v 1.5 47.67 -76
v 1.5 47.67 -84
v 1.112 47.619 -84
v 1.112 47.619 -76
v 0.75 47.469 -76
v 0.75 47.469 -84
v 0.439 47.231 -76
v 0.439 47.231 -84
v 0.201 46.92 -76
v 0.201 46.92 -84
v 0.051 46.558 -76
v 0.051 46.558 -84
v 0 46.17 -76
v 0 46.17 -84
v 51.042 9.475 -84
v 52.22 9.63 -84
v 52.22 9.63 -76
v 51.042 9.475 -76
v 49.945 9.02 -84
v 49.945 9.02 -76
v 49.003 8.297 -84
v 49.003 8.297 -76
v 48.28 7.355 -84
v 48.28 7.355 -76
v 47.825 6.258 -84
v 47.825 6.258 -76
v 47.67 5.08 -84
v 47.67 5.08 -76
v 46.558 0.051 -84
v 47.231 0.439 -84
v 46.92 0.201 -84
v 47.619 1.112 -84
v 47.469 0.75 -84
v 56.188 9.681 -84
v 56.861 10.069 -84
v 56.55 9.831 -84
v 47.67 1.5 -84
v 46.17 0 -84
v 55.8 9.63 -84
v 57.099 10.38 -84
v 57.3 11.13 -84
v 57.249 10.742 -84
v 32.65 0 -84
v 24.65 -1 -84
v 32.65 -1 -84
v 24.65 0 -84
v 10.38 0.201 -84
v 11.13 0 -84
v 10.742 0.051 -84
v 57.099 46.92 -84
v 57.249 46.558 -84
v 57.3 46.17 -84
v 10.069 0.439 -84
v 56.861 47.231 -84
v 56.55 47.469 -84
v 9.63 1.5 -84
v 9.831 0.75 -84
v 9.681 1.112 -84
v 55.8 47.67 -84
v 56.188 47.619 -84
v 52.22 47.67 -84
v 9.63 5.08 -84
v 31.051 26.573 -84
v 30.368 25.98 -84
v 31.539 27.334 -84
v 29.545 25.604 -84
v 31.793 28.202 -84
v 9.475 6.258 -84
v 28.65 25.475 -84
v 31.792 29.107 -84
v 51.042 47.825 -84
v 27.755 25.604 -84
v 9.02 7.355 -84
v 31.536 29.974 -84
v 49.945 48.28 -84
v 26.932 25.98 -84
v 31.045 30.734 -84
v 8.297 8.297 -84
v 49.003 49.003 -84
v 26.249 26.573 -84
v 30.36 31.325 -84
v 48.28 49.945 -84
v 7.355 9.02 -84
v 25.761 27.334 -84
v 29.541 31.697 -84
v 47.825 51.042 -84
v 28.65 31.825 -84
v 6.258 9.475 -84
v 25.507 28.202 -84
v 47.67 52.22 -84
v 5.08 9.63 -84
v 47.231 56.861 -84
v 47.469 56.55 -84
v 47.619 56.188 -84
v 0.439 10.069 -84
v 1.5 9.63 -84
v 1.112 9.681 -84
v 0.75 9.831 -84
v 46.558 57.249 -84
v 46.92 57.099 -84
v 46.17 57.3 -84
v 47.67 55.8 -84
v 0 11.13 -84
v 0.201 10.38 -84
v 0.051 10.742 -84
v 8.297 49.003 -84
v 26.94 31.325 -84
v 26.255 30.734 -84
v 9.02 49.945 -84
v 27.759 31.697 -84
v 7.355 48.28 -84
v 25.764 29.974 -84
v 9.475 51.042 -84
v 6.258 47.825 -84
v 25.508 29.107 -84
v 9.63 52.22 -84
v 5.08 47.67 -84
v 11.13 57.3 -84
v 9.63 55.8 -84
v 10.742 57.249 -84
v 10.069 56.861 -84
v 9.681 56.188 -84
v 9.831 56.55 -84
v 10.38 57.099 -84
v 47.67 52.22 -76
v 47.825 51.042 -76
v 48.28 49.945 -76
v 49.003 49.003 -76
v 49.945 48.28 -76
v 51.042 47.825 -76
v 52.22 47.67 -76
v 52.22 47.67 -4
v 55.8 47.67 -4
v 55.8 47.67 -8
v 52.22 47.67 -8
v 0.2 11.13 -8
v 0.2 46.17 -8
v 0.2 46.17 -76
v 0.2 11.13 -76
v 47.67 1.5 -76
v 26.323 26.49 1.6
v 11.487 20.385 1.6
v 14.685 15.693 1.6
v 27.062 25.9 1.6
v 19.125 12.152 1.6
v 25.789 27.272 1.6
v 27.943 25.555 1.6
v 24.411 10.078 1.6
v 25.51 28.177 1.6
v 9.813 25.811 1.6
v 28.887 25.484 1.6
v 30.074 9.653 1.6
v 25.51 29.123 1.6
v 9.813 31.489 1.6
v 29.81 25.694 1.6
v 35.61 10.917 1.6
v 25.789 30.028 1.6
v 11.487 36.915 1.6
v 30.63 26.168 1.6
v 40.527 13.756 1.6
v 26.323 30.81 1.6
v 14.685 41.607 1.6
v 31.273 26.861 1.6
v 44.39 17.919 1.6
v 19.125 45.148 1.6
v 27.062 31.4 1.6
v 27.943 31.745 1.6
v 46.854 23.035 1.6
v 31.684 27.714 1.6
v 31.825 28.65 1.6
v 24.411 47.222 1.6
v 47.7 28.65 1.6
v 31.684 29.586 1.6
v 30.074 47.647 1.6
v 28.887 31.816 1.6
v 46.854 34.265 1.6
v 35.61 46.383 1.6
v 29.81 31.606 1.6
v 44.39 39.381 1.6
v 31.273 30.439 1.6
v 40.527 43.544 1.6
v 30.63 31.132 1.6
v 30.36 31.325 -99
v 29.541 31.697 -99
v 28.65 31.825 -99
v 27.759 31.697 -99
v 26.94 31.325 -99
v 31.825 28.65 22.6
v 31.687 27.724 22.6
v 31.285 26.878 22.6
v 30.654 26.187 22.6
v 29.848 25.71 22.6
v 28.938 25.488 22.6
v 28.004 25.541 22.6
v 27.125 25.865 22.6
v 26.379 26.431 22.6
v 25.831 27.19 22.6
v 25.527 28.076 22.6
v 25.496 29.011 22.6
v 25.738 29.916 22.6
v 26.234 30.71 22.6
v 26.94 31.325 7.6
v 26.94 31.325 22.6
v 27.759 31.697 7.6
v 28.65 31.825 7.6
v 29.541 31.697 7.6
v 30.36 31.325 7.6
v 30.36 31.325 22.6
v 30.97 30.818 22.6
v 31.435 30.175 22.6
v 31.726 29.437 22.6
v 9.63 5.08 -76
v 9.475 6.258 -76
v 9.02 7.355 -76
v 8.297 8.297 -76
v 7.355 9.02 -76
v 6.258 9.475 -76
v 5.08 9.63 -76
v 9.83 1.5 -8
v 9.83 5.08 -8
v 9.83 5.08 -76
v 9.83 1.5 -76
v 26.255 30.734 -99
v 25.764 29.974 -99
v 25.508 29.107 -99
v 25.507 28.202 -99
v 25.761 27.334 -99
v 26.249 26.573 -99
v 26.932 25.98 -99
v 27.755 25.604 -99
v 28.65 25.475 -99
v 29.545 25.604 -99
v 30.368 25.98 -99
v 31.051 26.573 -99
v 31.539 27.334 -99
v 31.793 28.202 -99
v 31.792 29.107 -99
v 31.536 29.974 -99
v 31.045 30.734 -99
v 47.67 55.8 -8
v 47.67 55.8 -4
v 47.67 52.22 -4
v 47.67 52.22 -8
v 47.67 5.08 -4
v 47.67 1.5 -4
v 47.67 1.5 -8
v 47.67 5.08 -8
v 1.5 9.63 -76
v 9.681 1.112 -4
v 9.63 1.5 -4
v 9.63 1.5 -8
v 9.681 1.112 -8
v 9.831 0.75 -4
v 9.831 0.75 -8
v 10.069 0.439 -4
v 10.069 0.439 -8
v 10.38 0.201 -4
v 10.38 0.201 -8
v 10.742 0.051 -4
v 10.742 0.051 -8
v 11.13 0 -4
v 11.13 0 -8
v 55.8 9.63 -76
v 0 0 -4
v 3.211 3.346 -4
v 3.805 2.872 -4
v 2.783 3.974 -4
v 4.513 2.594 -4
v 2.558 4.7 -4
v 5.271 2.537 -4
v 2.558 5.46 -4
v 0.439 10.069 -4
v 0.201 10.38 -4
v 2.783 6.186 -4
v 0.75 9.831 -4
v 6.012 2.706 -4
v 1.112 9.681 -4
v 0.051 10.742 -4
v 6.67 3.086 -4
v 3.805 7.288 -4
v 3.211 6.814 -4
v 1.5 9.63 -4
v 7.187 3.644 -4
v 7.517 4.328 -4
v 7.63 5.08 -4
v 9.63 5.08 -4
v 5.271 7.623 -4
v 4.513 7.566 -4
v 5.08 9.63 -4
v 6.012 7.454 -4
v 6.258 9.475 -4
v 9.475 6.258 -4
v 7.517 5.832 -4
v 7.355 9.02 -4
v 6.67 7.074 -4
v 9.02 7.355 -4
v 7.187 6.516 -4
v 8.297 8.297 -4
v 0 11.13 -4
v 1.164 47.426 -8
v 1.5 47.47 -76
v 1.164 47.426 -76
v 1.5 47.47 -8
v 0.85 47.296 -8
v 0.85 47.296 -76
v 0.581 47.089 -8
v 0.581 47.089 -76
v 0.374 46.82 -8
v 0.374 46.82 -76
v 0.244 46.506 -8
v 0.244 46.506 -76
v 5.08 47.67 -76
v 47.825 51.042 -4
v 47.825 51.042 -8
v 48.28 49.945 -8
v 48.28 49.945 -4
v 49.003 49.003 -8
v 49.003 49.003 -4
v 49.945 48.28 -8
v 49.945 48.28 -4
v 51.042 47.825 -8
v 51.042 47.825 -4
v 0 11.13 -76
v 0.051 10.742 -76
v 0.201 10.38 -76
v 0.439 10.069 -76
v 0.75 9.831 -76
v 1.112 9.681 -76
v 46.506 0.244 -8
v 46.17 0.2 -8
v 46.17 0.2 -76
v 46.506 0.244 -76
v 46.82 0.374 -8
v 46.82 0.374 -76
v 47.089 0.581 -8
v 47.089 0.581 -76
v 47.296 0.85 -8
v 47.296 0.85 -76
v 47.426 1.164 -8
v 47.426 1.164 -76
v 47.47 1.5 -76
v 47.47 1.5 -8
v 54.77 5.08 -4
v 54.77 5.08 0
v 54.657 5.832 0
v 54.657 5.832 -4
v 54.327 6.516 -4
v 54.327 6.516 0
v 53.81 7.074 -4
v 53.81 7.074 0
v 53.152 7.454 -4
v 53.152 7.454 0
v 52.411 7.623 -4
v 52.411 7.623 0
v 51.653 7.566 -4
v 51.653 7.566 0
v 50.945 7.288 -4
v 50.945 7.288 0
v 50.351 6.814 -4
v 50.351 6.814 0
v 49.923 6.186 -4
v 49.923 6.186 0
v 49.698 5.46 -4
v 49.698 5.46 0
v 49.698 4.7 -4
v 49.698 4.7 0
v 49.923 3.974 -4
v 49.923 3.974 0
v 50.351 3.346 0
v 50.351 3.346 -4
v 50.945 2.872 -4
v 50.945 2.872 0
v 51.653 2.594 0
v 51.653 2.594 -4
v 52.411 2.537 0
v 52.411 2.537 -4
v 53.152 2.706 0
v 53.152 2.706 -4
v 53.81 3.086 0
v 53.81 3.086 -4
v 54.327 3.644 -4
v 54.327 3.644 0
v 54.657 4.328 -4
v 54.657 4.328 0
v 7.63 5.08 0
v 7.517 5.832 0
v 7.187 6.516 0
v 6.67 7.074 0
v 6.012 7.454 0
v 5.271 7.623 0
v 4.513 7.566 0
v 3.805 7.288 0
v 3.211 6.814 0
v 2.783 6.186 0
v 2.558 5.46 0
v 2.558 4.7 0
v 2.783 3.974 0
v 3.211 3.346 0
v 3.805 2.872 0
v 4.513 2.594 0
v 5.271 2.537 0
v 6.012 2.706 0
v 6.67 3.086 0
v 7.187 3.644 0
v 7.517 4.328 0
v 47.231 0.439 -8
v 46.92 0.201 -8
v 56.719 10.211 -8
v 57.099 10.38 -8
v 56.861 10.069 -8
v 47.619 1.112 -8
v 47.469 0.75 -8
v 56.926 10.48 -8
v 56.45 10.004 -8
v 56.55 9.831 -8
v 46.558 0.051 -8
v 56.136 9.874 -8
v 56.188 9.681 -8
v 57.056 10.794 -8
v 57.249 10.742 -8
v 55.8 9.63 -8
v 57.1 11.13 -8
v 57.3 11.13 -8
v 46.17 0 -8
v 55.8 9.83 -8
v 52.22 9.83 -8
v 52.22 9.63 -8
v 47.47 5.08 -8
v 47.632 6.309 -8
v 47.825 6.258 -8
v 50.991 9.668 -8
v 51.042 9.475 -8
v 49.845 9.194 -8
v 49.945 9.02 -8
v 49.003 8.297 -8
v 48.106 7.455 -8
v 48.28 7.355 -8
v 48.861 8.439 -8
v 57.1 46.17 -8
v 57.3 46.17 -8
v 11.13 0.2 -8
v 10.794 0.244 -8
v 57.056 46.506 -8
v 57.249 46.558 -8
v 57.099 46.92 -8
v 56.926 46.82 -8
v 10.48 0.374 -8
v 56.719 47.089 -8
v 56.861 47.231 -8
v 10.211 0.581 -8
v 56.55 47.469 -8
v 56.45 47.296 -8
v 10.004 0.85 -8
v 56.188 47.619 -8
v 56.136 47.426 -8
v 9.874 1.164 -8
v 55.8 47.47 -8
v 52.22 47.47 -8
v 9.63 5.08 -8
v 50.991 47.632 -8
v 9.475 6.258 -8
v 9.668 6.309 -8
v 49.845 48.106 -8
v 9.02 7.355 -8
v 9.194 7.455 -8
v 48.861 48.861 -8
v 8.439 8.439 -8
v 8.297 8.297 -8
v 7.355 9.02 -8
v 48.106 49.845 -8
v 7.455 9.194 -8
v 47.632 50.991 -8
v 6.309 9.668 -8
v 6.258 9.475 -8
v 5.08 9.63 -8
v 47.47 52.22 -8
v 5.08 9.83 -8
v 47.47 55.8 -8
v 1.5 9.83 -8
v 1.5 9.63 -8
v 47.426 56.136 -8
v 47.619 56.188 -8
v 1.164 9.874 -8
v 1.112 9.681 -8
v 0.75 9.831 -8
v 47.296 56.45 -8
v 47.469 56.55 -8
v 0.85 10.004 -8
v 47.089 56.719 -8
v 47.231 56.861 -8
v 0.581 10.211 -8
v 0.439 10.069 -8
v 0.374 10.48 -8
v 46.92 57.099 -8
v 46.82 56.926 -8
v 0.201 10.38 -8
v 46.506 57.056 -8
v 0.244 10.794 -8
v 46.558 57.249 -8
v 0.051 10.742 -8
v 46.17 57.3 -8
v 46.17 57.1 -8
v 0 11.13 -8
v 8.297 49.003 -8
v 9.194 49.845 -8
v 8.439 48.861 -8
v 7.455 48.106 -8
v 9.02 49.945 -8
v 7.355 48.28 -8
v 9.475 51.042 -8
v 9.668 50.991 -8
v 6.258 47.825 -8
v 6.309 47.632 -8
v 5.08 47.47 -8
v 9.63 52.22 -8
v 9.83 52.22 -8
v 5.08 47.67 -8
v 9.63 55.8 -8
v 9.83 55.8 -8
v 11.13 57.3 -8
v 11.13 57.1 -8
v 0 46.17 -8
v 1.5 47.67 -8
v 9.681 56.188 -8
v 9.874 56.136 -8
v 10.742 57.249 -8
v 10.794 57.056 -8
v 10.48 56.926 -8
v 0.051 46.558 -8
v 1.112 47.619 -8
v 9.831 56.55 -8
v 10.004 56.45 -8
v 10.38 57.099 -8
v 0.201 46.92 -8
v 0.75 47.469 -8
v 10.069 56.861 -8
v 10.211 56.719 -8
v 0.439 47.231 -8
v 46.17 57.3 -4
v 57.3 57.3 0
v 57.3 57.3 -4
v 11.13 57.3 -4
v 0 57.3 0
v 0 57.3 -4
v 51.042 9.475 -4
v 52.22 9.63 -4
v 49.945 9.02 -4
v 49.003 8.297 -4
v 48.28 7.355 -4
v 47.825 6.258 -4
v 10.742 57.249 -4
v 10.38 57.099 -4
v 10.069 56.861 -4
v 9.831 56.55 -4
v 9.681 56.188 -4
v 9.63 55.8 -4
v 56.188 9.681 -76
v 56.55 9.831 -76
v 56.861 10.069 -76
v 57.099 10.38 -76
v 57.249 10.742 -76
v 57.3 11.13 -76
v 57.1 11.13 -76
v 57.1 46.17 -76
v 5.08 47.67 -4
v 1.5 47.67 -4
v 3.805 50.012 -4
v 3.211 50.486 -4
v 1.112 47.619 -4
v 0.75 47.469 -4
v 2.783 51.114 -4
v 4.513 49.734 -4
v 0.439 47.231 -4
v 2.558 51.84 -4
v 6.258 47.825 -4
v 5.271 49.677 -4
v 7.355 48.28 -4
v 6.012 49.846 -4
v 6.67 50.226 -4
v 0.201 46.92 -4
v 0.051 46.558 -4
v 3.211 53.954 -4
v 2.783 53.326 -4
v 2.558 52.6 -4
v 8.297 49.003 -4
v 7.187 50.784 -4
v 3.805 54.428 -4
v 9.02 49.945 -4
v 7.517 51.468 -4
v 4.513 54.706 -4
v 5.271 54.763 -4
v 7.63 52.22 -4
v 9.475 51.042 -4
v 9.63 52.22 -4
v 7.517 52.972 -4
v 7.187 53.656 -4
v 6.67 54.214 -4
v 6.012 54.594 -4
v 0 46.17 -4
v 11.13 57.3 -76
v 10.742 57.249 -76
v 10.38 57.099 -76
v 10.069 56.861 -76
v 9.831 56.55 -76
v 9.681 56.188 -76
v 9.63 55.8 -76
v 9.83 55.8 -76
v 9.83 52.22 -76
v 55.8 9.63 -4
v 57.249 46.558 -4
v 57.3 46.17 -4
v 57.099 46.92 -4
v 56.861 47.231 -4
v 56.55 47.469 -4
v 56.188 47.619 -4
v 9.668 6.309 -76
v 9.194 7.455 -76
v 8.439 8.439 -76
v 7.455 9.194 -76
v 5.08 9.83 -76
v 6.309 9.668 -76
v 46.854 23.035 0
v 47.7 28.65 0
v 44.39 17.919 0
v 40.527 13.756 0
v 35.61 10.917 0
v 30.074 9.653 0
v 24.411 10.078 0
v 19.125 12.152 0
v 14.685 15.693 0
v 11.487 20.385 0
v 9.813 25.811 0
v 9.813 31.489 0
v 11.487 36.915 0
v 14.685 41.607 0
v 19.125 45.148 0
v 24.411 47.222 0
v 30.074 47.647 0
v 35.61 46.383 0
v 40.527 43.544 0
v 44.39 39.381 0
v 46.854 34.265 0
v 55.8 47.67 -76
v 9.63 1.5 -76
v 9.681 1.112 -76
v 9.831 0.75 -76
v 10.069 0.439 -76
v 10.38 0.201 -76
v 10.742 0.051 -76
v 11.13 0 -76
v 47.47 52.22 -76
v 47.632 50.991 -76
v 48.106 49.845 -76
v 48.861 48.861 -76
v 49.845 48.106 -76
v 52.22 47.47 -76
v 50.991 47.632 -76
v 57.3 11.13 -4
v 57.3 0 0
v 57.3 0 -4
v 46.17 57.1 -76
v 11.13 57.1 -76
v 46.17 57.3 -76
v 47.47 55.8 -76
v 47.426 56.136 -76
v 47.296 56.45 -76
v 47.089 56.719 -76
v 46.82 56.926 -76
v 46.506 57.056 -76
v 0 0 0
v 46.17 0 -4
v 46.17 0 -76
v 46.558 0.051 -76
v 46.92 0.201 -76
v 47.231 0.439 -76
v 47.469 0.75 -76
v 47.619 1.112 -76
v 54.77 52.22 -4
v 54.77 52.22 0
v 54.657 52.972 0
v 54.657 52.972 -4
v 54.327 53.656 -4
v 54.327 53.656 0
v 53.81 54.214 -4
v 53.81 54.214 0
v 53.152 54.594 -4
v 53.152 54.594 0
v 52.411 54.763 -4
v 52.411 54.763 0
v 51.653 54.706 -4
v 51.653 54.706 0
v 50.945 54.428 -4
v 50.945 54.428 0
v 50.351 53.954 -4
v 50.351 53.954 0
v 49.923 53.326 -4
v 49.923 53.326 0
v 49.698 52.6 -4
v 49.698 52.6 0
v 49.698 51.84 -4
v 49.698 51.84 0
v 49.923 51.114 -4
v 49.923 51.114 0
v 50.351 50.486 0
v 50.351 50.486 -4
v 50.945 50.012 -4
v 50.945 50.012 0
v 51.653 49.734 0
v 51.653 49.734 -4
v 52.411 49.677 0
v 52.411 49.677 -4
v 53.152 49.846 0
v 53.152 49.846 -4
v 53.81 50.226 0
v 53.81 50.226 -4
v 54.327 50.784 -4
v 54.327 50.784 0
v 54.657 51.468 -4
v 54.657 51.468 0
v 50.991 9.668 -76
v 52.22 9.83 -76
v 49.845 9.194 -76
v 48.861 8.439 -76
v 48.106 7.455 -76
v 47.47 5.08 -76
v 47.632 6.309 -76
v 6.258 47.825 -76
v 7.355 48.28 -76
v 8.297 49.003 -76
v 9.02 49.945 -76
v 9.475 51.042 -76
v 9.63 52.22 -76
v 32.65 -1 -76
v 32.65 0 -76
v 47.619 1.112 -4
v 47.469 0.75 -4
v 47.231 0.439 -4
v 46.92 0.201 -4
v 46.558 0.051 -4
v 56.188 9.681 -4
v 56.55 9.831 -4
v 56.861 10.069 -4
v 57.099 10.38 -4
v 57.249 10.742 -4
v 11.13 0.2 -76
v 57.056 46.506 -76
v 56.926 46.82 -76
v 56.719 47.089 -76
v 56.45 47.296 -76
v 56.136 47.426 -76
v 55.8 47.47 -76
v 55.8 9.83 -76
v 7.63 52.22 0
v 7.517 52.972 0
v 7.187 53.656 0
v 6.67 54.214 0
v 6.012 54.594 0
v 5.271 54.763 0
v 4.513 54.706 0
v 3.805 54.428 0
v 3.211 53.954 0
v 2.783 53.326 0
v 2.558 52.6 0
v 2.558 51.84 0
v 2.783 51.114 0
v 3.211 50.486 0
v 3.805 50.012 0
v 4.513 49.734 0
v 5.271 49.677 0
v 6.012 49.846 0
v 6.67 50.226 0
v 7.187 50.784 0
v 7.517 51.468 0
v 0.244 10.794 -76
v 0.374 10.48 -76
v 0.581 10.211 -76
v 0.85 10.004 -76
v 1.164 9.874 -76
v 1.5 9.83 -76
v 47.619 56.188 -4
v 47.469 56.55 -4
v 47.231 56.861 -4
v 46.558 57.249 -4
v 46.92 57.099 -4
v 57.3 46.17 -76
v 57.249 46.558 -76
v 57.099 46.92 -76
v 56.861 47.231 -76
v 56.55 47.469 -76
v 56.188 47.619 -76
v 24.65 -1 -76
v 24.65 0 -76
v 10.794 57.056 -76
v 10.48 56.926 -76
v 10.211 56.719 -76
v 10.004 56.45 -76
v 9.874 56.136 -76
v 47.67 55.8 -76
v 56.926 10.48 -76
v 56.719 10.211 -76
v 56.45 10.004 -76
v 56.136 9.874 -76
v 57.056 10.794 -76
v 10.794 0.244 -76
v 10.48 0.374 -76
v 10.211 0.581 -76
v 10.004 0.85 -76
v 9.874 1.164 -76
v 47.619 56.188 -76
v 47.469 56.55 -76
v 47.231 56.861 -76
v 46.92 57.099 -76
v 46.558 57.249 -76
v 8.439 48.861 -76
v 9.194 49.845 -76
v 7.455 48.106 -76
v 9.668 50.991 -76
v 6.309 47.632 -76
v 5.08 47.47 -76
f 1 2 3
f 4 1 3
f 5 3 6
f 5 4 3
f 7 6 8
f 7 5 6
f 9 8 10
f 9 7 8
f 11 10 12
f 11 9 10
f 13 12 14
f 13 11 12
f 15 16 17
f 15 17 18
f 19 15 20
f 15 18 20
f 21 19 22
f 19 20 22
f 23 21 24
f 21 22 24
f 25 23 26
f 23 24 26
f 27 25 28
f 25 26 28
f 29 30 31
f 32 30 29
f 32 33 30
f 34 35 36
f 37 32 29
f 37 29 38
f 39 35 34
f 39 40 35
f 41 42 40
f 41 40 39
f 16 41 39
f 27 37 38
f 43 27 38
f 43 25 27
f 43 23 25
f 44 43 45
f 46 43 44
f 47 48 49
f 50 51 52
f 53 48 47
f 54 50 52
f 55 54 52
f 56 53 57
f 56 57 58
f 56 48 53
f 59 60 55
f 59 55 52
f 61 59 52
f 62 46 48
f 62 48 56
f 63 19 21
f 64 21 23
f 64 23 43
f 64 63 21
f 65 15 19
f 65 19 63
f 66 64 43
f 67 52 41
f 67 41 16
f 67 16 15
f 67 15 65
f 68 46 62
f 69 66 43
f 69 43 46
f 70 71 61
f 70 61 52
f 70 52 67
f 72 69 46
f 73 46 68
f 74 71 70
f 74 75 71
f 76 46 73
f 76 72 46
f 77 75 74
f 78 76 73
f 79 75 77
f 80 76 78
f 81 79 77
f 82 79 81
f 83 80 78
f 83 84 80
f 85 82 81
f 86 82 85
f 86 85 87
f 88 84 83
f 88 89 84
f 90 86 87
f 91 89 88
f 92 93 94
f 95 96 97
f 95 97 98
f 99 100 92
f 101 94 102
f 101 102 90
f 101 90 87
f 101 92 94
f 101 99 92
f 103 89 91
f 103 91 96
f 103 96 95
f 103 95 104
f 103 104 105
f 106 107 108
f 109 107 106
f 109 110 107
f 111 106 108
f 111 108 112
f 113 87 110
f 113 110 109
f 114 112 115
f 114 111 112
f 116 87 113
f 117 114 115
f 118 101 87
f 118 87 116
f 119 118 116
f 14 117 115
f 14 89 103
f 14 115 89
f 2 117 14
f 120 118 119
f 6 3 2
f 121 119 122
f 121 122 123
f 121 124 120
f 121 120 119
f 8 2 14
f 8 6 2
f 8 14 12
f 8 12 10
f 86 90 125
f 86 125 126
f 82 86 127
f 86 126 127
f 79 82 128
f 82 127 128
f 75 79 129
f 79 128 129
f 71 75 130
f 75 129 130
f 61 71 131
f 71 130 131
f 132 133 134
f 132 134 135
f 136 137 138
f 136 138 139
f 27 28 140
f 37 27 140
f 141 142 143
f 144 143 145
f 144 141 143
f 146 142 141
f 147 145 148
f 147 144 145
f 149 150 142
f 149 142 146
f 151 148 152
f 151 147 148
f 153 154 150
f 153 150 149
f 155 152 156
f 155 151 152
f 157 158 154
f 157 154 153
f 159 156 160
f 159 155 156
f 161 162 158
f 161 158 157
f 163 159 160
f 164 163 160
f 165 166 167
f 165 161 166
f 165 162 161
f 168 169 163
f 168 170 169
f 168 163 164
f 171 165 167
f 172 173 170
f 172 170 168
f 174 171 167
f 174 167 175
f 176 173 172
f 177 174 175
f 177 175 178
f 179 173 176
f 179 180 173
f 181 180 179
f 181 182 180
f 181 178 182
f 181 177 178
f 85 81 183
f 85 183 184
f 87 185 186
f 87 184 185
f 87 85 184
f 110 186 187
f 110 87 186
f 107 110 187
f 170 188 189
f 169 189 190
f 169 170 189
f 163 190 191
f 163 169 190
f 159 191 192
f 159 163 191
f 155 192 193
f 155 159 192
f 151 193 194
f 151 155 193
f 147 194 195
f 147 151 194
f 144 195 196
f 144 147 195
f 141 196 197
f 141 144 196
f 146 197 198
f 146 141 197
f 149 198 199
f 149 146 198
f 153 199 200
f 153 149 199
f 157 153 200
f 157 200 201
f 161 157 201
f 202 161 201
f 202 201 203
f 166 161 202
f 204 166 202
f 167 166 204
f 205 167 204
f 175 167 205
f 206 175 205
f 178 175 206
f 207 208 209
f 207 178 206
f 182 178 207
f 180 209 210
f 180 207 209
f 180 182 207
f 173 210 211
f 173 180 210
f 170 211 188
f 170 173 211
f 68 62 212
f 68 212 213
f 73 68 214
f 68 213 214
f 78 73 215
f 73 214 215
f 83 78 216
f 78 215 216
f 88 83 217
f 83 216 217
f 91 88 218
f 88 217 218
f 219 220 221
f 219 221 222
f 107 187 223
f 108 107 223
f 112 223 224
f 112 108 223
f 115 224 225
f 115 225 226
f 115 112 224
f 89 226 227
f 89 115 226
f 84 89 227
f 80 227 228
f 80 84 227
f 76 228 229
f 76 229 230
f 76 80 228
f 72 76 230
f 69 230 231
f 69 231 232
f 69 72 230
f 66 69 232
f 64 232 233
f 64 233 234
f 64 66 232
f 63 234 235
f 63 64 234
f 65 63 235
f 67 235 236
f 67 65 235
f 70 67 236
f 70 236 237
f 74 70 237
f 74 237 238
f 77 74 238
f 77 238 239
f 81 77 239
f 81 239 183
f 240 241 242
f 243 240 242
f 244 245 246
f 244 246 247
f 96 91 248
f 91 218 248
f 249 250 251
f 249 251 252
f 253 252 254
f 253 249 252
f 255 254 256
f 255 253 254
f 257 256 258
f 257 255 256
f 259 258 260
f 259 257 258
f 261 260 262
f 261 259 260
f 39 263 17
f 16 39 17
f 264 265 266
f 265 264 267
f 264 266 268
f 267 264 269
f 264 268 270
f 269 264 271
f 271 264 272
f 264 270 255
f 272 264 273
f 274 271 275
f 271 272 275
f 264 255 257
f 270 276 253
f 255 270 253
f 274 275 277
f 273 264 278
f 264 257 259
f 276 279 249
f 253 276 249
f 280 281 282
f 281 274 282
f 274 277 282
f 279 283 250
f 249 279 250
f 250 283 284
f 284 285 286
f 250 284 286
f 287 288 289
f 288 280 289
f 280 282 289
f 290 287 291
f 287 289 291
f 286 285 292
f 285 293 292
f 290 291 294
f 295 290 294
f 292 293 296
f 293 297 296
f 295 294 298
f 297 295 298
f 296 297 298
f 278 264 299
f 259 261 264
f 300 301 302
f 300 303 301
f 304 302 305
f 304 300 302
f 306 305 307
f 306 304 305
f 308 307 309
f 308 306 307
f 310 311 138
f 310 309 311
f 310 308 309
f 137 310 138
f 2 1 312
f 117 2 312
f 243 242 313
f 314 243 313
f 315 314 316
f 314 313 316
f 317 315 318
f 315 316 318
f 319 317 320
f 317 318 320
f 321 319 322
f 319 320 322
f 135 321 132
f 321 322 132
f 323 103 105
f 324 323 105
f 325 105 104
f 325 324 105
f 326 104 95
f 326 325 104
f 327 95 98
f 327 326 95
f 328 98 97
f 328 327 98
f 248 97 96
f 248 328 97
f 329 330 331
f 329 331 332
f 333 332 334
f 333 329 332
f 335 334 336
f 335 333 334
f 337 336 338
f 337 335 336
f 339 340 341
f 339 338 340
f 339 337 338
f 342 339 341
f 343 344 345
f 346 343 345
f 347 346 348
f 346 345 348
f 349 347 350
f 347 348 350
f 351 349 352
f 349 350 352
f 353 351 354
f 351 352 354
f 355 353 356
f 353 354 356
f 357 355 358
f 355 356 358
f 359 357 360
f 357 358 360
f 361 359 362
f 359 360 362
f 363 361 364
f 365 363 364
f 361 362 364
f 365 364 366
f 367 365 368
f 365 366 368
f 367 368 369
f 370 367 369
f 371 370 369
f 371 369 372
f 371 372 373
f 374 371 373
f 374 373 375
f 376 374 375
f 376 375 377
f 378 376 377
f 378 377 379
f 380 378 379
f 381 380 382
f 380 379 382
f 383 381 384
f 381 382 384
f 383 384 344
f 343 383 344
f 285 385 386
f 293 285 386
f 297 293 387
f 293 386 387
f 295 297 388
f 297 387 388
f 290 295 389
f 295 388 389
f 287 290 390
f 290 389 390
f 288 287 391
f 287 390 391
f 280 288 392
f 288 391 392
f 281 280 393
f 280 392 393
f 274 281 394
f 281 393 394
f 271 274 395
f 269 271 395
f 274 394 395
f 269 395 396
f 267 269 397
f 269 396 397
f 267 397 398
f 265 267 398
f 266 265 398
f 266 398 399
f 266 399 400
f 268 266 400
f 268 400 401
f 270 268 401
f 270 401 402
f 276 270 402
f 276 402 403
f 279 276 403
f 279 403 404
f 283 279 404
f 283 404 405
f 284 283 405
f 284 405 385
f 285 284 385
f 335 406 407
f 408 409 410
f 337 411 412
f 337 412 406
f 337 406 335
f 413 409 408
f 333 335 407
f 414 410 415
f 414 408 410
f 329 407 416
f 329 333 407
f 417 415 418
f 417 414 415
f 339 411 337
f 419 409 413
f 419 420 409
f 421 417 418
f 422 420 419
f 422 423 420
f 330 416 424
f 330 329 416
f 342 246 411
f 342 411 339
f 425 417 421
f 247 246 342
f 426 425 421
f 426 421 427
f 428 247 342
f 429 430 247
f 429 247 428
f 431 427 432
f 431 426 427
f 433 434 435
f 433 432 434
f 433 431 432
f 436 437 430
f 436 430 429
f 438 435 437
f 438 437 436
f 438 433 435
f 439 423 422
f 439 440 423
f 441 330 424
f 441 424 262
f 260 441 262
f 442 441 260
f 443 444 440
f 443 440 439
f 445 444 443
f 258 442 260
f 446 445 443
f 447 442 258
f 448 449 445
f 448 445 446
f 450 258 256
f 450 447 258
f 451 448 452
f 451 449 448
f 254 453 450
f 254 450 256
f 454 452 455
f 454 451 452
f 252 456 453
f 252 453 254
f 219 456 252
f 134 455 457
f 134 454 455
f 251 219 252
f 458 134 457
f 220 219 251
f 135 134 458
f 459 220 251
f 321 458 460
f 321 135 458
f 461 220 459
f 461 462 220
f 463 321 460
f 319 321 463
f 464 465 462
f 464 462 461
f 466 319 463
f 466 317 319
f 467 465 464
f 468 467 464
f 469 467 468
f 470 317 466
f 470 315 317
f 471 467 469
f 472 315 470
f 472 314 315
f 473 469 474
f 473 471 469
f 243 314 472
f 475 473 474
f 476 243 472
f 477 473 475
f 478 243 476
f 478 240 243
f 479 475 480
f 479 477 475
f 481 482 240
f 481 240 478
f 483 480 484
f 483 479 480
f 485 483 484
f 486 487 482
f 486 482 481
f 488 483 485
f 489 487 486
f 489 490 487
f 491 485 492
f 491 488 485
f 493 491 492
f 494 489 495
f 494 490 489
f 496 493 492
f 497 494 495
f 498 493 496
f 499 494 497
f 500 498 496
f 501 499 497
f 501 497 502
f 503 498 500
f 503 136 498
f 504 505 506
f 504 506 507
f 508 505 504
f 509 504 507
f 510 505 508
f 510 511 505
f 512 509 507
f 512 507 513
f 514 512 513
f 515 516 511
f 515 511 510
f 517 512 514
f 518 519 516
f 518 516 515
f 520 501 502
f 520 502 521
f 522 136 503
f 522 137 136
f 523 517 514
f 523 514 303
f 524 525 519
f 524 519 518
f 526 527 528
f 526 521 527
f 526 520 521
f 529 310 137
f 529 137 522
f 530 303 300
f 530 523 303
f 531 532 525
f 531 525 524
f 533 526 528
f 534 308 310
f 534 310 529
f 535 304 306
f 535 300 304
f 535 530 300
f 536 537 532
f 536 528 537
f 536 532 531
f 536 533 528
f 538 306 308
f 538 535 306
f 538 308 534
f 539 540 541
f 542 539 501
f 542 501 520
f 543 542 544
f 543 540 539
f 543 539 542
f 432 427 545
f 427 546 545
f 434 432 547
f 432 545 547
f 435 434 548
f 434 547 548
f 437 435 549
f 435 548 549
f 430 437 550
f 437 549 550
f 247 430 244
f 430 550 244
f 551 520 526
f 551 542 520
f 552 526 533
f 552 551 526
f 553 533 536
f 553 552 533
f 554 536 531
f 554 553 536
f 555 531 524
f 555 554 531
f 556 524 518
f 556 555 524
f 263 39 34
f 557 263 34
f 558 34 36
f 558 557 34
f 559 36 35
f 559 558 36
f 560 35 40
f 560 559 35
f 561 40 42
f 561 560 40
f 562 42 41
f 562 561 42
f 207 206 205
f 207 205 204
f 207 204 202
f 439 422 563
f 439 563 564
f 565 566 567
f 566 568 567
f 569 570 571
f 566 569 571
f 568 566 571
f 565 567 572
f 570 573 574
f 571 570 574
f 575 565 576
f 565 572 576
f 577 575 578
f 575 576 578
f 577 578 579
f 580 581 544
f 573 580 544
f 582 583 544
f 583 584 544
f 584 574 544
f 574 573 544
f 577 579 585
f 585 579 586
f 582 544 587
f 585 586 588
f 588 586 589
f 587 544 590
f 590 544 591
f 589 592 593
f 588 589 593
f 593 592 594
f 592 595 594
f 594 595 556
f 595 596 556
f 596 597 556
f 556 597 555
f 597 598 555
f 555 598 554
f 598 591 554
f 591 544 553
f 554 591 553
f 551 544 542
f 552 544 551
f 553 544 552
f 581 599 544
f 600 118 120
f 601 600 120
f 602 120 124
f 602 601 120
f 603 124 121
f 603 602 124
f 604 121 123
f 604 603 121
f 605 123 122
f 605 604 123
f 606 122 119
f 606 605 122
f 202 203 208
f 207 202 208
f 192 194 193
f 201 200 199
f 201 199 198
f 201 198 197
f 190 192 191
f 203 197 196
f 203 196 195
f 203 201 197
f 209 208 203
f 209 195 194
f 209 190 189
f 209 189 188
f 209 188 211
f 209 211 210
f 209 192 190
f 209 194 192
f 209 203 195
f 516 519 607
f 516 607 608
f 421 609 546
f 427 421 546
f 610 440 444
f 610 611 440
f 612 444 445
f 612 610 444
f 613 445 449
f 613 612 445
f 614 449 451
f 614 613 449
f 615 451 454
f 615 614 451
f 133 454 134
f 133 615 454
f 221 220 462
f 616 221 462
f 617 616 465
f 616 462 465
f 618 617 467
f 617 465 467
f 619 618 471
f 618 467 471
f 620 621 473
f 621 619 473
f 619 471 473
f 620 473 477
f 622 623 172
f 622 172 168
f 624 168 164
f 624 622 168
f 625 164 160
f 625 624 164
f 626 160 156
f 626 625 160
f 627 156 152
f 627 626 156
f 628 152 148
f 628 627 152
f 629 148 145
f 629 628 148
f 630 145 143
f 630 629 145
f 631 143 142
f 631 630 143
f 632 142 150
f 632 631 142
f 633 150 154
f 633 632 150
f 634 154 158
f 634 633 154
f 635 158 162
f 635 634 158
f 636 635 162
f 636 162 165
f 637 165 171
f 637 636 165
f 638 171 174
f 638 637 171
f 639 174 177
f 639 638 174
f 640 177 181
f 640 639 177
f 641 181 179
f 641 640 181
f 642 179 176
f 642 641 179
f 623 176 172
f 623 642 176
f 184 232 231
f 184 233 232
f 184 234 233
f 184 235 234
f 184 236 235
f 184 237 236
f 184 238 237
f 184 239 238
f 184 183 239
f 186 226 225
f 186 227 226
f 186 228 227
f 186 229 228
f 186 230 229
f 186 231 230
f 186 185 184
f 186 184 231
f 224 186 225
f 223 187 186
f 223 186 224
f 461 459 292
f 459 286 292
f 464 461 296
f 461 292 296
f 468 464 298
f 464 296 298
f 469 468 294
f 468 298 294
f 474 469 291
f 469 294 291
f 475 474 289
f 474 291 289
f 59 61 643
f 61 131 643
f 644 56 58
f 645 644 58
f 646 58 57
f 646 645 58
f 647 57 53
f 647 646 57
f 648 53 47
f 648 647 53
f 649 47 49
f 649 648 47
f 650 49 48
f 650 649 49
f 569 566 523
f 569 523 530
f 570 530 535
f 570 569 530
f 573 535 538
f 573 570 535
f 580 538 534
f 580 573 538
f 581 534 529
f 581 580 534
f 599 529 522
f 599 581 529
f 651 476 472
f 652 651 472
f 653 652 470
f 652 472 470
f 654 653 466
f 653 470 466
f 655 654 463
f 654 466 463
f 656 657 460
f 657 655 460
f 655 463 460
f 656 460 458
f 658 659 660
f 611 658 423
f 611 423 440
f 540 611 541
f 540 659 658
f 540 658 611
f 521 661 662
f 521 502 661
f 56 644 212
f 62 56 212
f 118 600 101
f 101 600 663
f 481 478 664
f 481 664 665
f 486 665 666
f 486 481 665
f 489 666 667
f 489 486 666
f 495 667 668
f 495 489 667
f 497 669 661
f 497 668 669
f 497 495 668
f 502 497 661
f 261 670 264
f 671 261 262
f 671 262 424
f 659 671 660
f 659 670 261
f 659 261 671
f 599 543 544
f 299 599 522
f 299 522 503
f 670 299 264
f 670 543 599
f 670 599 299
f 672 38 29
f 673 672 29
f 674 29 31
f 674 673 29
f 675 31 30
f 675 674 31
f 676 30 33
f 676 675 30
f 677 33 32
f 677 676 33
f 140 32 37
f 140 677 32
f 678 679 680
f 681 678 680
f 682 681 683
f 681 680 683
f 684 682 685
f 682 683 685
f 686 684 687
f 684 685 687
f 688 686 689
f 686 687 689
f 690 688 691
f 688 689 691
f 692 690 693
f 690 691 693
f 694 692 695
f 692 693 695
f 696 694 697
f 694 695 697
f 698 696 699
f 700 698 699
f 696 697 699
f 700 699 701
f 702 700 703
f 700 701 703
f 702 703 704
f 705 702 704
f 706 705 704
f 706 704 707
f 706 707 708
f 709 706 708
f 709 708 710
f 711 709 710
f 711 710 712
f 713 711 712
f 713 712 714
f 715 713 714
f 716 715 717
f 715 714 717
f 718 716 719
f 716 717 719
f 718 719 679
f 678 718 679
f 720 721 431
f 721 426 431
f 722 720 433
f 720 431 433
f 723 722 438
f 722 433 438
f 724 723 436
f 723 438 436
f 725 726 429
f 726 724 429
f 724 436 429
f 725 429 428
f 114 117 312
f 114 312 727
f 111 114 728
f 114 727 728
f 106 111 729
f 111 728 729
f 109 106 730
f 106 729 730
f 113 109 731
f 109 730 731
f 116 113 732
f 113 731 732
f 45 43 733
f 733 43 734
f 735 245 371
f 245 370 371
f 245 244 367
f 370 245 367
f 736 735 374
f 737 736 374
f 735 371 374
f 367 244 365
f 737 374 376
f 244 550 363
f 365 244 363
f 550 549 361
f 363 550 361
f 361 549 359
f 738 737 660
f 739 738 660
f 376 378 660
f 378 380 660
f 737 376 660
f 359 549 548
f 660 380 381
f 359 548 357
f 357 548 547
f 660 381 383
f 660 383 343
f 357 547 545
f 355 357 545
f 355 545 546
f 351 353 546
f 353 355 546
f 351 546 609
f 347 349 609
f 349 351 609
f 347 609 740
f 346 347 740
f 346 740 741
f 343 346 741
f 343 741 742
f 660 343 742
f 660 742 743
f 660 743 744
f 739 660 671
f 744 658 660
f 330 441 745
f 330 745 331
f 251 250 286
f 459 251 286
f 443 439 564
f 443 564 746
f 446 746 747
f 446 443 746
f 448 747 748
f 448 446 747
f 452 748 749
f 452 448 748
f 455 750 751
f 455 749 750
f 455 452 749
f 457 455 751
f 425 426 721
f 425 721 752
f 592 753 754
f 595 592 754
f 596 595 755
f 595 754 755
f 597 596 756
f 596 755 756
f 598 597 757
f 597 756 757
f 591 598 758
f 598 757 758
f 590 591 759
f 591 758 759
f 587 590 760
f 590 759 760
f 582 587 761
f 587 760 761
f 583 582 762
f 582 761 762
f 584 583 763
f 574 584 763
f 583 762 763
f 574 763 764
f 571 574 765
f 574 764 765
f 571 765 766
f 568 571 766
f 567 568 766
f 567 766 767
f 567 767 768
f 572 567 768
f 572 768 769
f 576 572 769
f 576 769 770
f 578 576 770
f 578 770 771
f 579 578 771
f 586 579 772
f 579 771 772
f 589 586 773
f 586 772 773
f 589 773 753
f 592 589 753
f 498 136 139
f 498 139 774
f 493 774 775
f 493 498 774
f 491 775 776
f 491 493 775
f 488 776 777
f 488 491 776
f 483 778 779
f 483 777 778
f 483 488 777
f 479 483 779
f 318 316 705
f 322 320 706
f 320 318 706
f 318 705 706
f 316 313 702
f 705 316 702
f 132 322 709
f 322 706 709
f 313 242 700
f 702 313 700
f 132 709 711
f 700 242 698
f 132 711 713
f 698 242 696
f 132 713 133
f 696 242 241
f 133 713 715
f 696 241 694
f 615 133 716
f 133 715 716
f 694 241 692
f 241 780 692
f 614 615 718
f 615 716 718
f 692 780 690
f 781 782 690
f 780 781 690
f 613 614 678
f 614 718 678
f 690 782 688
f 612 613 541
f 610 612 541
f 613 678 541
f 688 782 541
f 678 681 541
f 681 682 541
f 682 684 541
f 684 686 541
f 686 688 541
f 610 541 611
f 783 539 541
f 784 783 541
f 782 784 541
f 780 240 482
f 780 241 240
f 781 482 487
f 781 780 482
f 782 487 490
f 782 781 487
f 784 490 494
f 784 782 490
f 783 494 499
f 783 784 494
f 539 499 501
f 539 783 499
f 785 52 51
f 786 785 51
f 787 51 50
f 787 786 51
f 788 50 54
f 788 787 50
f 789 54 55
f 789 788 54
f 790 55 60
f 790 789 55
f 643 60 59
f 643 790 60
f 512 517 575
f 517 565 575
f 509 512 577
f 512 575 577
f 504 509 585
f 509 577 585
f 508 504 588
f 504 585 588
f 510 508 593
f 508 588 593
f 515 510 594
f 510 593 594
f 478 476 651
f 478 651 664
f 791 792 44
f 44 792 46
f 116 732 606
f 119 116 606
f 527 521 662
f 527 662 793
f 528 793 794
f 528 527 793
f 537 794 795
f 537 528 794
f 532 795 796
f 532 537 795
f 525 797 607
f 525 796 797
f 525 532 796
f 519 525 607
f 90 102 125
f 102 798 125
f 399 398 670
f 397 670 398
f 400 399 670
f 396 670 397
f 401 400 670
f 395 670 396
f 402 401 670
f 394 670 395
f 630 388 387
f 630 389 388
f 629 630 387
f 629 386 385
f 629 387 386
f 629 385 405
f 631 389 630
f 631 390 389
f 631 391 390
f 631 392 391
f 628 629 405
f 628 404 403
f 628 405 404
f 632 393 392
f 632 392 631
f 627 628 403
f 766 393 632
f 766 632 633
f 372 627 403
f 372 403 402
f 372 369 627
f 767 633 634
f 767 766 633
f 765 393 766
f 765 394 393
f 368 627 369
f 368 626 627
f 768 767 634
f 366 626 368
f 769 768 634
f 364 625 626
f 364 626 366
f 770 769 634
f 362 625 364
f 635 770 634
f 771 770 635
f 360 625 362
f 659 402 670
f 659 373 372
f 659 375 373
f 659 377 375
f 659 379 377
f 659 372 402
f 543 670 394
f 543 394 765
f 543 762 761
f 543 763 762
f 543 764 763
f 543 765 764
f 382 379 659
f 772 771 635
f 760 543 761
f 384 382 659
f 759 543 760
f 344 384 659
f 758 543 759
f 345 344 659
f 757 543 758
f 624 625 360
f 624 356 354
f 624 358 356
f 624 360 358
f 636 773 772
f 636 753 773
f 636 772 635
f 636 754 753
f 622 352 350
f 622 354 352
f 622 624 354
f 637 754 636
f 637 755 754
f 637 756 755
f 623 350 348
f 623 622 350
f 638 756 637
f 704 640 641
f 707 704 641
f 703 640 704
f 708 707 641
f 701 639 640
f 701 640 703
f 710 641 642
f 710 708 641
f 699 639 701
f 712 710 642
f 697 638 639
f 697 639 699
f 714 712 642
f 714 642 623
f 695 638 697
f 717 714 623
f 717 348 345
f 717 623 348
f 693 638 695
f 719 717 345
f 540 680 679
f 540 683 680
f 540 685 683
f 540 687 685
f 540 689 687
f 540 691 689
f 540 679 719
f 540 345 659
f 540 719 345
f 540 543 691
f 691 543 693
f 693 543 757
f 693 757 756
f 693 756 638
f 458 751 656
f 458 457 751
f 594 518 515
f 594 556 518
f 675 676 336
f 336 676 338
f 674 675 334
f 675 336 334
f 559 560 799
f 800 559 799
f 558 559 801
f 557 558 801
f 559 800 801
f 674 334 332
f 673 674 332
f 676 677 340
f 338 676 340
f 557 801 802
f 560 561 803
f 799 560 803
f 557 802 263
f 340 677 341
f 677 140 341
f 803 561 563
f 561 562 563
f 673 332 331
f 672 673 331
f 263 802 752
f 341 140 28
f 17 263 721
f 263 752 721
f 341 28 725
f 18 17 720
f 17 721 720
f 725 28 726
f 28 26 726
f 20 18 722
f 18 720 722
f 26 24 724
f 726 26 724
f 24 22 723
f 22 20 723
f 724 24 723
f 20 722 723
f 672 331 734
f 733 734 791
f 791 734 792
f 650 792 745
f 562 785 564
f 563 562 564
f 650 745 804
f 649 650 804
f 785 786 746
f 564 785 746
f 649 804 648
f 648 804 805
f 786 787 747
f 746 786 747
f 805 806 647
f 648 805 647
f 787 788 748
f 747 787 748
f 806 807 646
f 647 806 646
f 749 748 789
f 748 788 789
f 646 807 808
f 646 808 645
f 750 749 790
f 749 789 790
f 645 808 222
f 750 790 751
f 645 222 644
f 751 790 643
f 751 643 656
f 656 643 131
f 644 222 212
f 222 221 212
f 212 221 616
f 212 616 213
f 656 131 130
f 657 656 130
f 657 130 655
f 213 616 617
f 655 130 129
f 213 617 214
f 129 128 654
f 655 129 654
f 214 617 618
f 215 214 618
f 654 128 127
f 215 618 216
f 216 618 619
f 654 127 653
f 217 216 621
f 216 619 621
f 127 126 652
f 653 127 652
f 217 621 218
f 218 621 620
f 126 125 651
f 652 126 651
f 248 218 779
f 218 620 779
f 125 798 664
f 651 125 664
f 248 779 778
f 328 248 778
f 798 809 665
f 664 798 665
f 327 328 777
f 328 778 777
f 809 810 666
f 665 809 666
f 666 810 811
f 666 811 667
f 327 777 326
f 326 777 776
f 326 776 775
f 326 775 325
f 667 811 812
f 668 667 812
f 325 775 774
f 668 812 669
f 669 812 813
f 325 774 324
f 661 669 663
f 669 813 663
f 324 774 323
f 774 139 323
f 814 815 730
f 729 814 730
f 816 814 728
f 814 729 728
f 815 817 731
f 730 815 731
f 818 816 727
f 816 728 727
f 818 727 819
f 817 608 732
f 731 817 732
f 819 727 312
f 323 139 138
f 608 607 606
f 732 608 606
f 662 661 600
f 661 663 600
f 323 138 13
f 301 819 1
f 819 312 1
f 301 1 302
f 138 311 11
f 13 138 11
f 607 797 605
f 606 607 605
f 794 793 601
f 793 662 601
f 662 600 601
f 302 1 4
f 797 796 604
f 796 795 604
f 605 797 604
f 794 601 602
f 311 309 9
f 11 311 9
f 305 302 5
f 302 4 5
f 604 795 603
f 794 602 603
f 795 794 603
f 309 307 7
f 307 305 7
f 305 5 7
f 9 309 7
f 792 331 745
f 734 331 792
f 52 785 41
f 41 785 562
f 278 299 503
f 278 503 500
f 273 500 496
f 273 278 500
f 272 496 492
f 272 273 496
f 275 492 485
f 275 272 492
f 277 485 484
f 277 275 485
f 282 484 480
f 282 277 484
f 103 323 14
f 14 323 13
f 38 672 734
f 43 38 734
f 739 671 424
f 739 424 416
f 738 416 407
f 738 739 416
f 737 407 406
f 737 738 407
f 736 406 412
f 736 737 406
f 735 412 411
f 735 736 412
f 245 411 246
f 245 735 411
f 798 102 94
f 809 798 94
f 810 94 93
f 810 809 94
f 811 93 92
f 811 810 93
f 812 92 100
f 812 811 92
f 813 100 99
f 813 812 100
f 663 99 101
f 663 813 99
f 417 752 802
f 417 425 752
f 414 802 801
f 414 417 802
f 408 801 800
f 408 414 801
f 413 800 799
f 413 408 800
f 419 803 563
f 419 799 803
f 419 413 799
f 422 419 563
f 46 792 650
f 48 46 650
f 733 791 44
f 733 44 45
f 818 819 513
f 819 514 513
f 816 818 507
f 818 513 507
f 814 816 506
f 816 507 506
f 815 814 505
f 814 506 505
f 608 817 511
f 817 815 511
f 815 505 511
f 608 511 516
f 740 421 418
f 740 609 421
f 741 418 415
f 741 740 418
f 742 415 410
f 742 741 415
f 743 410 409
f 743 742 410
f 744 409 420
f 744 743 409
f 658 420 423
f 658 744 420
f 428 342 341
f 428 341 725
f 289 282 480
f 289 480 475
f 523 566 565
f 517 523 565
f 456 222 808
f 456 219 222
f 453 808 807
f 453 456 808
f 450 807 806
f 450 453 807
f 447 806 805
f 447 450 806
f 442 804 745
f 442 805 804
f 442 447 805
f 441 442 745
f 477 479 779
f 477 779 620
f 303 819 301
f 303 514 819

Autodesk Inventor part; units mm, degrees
ref_plane "YZ Plane" through (0, 0, 0) normal (1, 0, 0) x (0, 1, 0)
ref_plane "XZ Plane" through (0, 0, 0) normal (0, 1, 0) x (-1, 0, 0)
ref_plane "XY Plane" through (0, 0, 0) normal (0, 0, 1) x (1, 0, 0)
sketch "Sketch1" plane through (0, 0, 0) normal (0, 0, 1) x (1, 0, 0)
  line L0 (0, 0) -> (57.3, 0)
  line L1 (57.3, 0) -> (57.3, 57.3)
  line L2 (57.3, 57.3) -> (0, 57.3)
  line L3 (0, 57.3) -> (0, 0)
  line L4 (5.08, 52.22) -> (52.22, 52.22) construction
  line L5 (52.22, 52.22) -> (52.22, 5.08) construction
  line L6 (52.22, 5.08) -> (5.08, 5.08) construction
  line L7 (5.08, 5.08) -> (5.08, 52.22) construction
  line L8 (5.08, 52.22) -> (5.08, 57.3) construction
  line L9 (5.08, 52.22) -> (0, 52.22) construction
  line L10 (52.22, 5.08) -> (52.22, 0) construction
  line L11 (52.22, 5.08) -> (57.3, 5.08) construction
  circle A0 centre (5.08, 52.22) radius 2.55
  circle A1 centre (52.22, 52.22) radius 2.55
  circle A2 centre (5.08, 5.08) radius 2.55
  circle A3 centre (52.22, 5.08) radius 2.55
  line L12 (28.65, 57.3) -> (28.65, 0) construction
  circle A4 centre (28.65, 28.65) radius 19.55
  dimension "d0" = 57.3
  dimension "d1" = 57.3
  dimension "d2" = 47.14
  dimension "d3" = 47.14
  dimension "d4" = 5.1
  dimension "d5" = 5.1
  dimension "d6" = 5.1
  dimension "d7" = 5.1
  dimension "d8" = 39.1
extrude "Extrusion1" add sketch "Sketch1" against normal blind 4 contours L3 L2 L1 L0 | A4
sketch "Sketch2" plane through (0, 0, 0) normal (0, 0, 1) x (1, 0, 0)
  line L0 (0, 57.3) -> (57.3, 57.3) construction
  line L1 (28.65, 57.3) -> (28.65, 0) construction
  line L2 (57.3, 0) -> (0, 0) construction
  circle A0 centre (28.65, 28.65) radius 19.05
  dimension "d11" = 38.1
extrude "Extrusion2" add sketch "Sketch2" along normal blind 1.6
sketch "Sketch3" plane through (28.65, 28.65, 1.6) normal (0, 0, 1) x (1, 0, 0)
  circle A0 centre (0, 0) radius 3.175
  point P0 (-28.65, -28.65)
  dimension "d14" = 6.35
extrude "Extrusion3" add sketch "Sketch3" along normal blind 21
sketch "Sketch4" plane through (28.65, 28.65, 22.6) normal (0, 0, 1) x (1, 0, 0)
  circle A0 centre (0, 0) radius 3.175 projected
  line L0 (-1.7103, 2.675) -> (1.7103, 2.675)
  point P0 (-28.65, -28.65)
  dimension "d17" = 2.675
extrude "Extrusion4" cut sketch "Sketch4" against normal blind 15 contours L0 A0 picked at (-0.3543, 2.7806)
sketch "Sketch5" plane through (0, 0, -4) normal (0, 0, -1) x (-1, 0, 0)
  line L0 (-57.3, 57.3) -> (-57.3, 0) projected
  line L1 (-57.3, 0) -> (0, 0) projected
  line L2 (0, 0) -> (0, 57.3) projected
  line L3 (0, 57.3) -> (-57.3, 57.3) projected
  circle A0 centre (-5.08, 52.22) radius 2.55 projected
  circle A1 centre (-52.22, 52.22) radius 2.55 projected
  circle A2 centre (-5.08, 5.08) radius 2.55 projected
  circle A3 centre (-52.22, 5.08) radius 2.55 projected
  arc A4 (-52.22, 47.67) -> (-47.67, 52.22) centre (-52.22, 52.22) ccw
  arc A5 (-9.63, 52.22) -> (-5.08, 47.67) centre (-5.08, 52.22) ccw
  arc A6 (-5.08, 9.63) -> (-9.63, 5.08) centre (-5.08, 5.08) ccw
  arc A7 (-47.67, 5.08) -> (-52.22, 9.63) centre (-52.22, 5.08) ccw
  line L4 (0, 57.3) -> (-57.3, 57.3) projected
  line L5 (-47.67, 55.8) -> (-47.67, 52.22)
  line L6 (-9.63, 55.8) -> (-9.63, 52.22)
  line L7 (-57.3, 0) -> (-57.3, 57.3) projected
  line L8 (-55.8, 47.67) -> (-52.22, 47.67)
  line L9 (-55.8, 9.63) -> (-52.22, 9.63)
  line L10 (0, 0) -> (-57.3, 0) projected
  line L11 (-47.67, 1.5) -> (-47.67, 5.08)
  line L12 (-9.63, 1.5) -> (-9.63, 5.08)
  line L13 (0, 57.3) -> (0, 0) projected
  line L14 (-1.5, 47.67) -> (-5.08, 47.67)
  line L15 (-1.5, 9.63) -> (-5.08, 9.63)
  line L16 (0, 0) -> (0, 57.3) projected
  line L17 (-57.3, 0) -> (0, 0) projected
  line L18 (-57.3, 57.3) -> (-57.3, 0) projected
  arc A8 (-55.8, 47.67) -> (-57.3, 46.17) centre (-55.8, 46.17) ccw
  arc A9 (-46.17, 57.3) -> (-47.67, 55.8) centre (-46.17, 55.8) ccw
  arc A10 (-9.63, 55.8) -> (-11.13, 57.3) centre (-11.13, 55.8) ccw
  arc A11 (0, 46.17) -> (-1.5, 47.67) centre (-1.5, 46.17) ccw
  arc A12 (-1.5, 9.63) -> (0, 11.13) centre (-1.5, 11.13) ccw
  arc A13 (-11.13, 0) -> (-9.63, 1.5) centre (-11.13, 1.5) ccw
  arc A14 (-47.67, 1.5) -> (-46.17, 0) centre (-46.17, 1.5) ccw
  arc A15 (-57.3, 11.13) -> (-55.8, 9.63) centre (-55.8, 11.13) ccw
  dimension "d20" = 2
  dimension "d21" = 2
  dimension "d22" = 2
  dimension "d23" = 2
  dimension "d24" = 3
  dimension "d25" = 3
  dimension "d26" = 3
  dimension "d27" = 3
  dimension "d28" = 3
  dimension "d29" = 3
  dimension "d30" = 3
  dimension "d31" = 3
extrude "Extrusion5" add sketch "Sketch5" along normal blind 4 contours A8 L8 A4 L5 A9 L3 A10 L6 A5 L14 A11 L2 A12 L15 A6 L12 A13 L1 A14 L11 A7 L9 A15 L0
sketch "Sketch6" plane through (0, 0, -8) normal (0, 0, -1) x (-1, 0, 0)
  arc A0 (-52.22, 47.67) -> (-47.67, 52.22) centre (-52.22, 52.22) ccw projected
  line L0 (-52.22, 47.67) -> (-55.8, 47.67) projected
  arc A1 (-55.8, 47.67) -> (-57.3, 46.17) centre (-55.8, 46.17) ccw projected
  line L1 (-57.3, 46.17) -> (-57.3, 11.13) projected
  arc A2 (-57.3, 11.13) -> (-55.8, 9.63) centre (-55.8, 11.13) ccw projected
  line L2 (-55.8, 9.63) -> (-52.22, 9.63) projected
  arc A3 (-47.67, 5.08) -> (-52.22, 9.63) centre (-52.22, 5.08) ccw projected
  line L3 (-47.67, 5.08) -> (-47.67, 1.5) projected
  arc A4 (-47.67, 1.5) -> (-46.17, 0) centre (-46.17, 1.5) ccw projected
  line L4 (-46.17, 0) -> (-11.13, 0) projected
  arc A5 (-11.13, 0) -> (-9.63, 1.5) centre (-11.13, 1.5) ccw projected
  line L5 (-9.63, 1.5) -> (-9.63, 5.08) projected
  arc A6 (-5.08, 9.63) -> (-9.63, 5.08) centre (-5.08, 5.08) ccw projected
  line L6 (-5.08, 9.63) -> (-1.5, 9.63) projected
  arc A7 (-1.5, 9.63) -> (0, 11.13) centre (-1.5, 11.13) ccw projected
  line L7 (0, 11.13) -> (0, 46.17) projected
  arc A8 (0, 46.17) -> (-1.5, 47.67) centre (-1.5, 46.17) ccw projected
  line L8 (-1.5, 47.67) -> (-5.08, 47.67) projected
  arc A9 (-9.63, 52.22) -> (-5.08, 47.67) centre (-5.08, 52.22) ccw projected
  line L9 (-9.63, 52.22) -> (-9.63, 55.8) projected
  arc A10 (-9.63, 55.8) -> (-11.13, 57.3) centre (-11.13, 55.8) ccw projected
  line L10 (-11.13, 57.3) -> (-46.17, 57.3) projected
  arc A11 (-46.17, 57.3) -> (-47.67, 55.8) centre (-46.17, 55.8) ccw projected
  line L11 (-47.67, 55.8) -> (-47.67, 52.22) projected
  line L12 (-55.8, 47.47) -> (-52.22, 47.47)
  arc A12 (-52.22, 47.47) -> (-47.47, 52.22) centre (-52.22, 52.22) ccw
  line L13 (-47.47, 52.22) -> (-47.47, 55.8)
  arc A13 (-46.17, 57.1) -> (-47.47, 55.8) centre (-46.17, 55.8) ccw
  line L14 (-46.17, 57.1) -> (-11.13, 57.1)
  arc A14 (-9.83, 55.8) -> (-11.13, 57.1) centre (-11.13, 55.8) ccw
  line L15 (-9.83, 55.8) -> (-9.83, 52.22)
  arc A15 (-9.83, 52.22) -> (-5.08, 47.47) centre (-5.08, 52.22) ccw
  line L16 (-5.08, 47.47) -> (-1.5, 47.47)
  arc A16 (-0.2, 46.17) -> (-1.5, 47.47) centre (-1.5, 46.17) ccw
  line L17 (-0.2, 46.17) -> (-0.2, 11.13)
  arc A17 (-1.5, 9.83) -> (-0.2, 11.13) centre (-1.5, 11.13) ccw
  line L18 (-1.5, 9.83) -> (-5.08, 9.83)
  arc A18 (-5.08, 9.83) -> (-9.83, 5.08) centre (-5.08, 5.08) ccw
  line L19 (-9.83, 5.08) -> (-9.83, 1.5)
  arc A19 (-11.13, 0.2) -> (-9.83, 1.5) centre (-11.13, 1.5) ccw
  line L20 (-11.13, 0.2) -> (-46.17, 0.2)
  arc A20 (-47.47, 1.5) -> (-46.17, 0.2) centre (-46.17, 1.5) ccw
  line L21 (-47.47, 1.5) -> (-47.47, 5.08)
  arc A21 (-47.47, 5.08) -> (-52.22, 9.83) centre (-52.22, 5.08) ccw
  line L22 (-52.22, 9.83) -> (-55.8, 9.83)
  arc A22 (-57.1, 11.13) -> (-55.8, 9.83) centre (-55.8, 11.13) ccw
  line L23 (-57.1, 11.13) -> (-57.1, 46.17)
  arc A23 (-55.8, 47.47) -> (-57.1, 46.17) centre (-55.8, 46.17) ccw
  point P0 (0, 0)
  dimension "d34" = 0.2
extrude "Extrusion6" add sketch "Sketch6" along normal blind 68 contours L12 A12 L13 A13 L14 A14 L15 A15 L16 A16 L17 A17 L18 A18 L19 A19 L20 A20 L21 A21 L22 A22 L23 A23
sketch "Sketch7" plane through (0, 0, -76) normal (0, 0, -1) x (-1, 0, 0)
  arc A0 (-57.1, 11.13) -> (-55.8, 9.83) centre (-55.8, 11.13) ccw projected
  line L0 (-57.1, 11.13) -> (-57.1, 46.17) projected
  arc A1 (-55.8, 47.47) -> (-57.1, 46.17) centre (-55.8, 46.17) ccw projected
  line L1 (-55.8, 47.47) -> (-52.22, 47.47) projected
  arc A2 (-52.22, 47.47) -> (-47.47, 52.22) centre (-52.22, 52.22) ccw projected
  line L2 (-47.47, 52.22) -> (-47.47, 55.8) projected
  arc A3 (-46.17, 57.1) -> (-47.47, 55.8) centre (-46.17, 55.8) ccw projected
  line L3 (-46.17, 57.1) -> (-11.13, 57.1) projected
  arc A4 (-9.83, 55.8) -> (-11.13, 57.1) centre (-11.13, 55.8) ccw projected
  line L4 (-9.83, 55.8) -> (-9.83, 52.22) projected
  arc A5 (-9.83, 52.22) -> (-5.08, 47.47) centre (-5.08, 52.22) ccw projected
  line L5 (-5.08, 47.47) -> (-1.5, 47.47) projected
  arc A6 (-0.2, 46.17) -> (-1.5, 47.47) centre (-1.5, 46.17) ccw projected
  line L6 (-0.2, 46.17) -> (-0.2, 11.13) projected
  arc A7 (-1.5, 9.83) -> (-0.2, 11.13) centre (-1.5, 11.13) ccw projected
  line L7 (-1.5, 9.83) -> (-5.08, 9.83) projected
  arc A8 (-5.08, 9.83) -> (-9.83, 5.08) centre (-5.08, 5.08) ccw projected
  line L8 (-9.83, 5.08) -> (-9.83, 1.5) projected
  arc A9 (-11.13, 0.2) -> (-9.83, 1.5) centre (-11.13, 1.5) ccw projected
  line L9 (-11.13, 0.2) -> (-46.17, 0.2) projected
  arc A10 (-47.47, 1.5) -> (-46.17, 0.2) centre (-46.17, 1.5) ccw projected
  line L10 (-47.47, 1.5) -> (-47.47, 5.08) projected
  arc A11 (-47.47, 5.08) -> (-52.22, 9.83) centre (-52.22, 5.08) ccw projected
  line L11 (-52.22, 9.83) -> (-55.8, 9.83) projected
  arc A12 (-52.22, 47.67) -> (-47.67, 52.22) centre (-52.22, 52.22) ccw projected
  line L12 (-52.22, 47.67) -> (-55.8, 47.67) projected
  arc A13 (-55.8, 47.67) -> (-57.3, 46.17) centre (-55.8, 46.17) ccw projected
  line L13 (-57.3, 46.17) -> (-57.3, 11.13) projected
  arc A14 (-57.3, 11.13) -> (-55.8, 9.63) centre (-55.8, 11.13) ccw projected
  line L14 (-55.8, 9.63) -> (-52.22, 9.63) projected
  arc A15 (-47.67, 5.08) -> (-52.22, 9.63) centre (-52.22, 5.08) ccw projected
  line L15 (-47.67, 5.08) -> (-47.67, 1.5) projected
  arc A16 (-47.67, 1.5) -> (-46.17, 0) centre (-46.17, 1.5) ccw projected
  line L16 (-46.17, 0) -> (-11.13, 0) projected
  arc A17 (-11.13, 0) -> (-9.63, 1.5) centre (-11.13, 1.5) ccw projected
  line L17 (-9.63, 1.5) -> (-9.63, 5.08) projected
  arc A18 (-5.08, 9.63) -> (-9.63, 5.08) centre (-5.08, 5.08) ccw projected
  line L18 (-5.08, 9.63) -> (-1.5, 9.63) projected
  arc A19 (-1.5, 9.63) -> (0, 11.13) centre (-1.5, 11.13) ccw projected
  line L19 (0, 11.13) -> (0, 46.17) projected
  arc A20 (0, 46.17) -> (-1.5, 47.67) centre (-1.5, 46.17) ccw projected
  line L20 (-1.5, 47.67) -> (-5.08, 47.67) projected
  arc A21 (-9.63, 52.22) -> (-5.08, 47.67) centre (-5.08, 52.22) ccw projected
  line L21 (-9.63, 52.22) -> (-9.63, 55.8) projected
  arc A22 (-9.63, 55.8) -> (-11.13, 57.3) centre (-11.13, 55.8) ccw projected
  line L22 (-11.13, 57.3) -> (-46.17, 57.3) projected
  arc A23 (-46.17, 57.3) -> (-47.67, 55.8) centre (-46.17, 55.8) ccw projected
  line L23 (-47.67, 55.8) -> (-47.67, 52.22) projected
  point P0 (0, 0)
extrude "Extrusion7" add sketch "Sketch7" along normal blind 8 contours L0 A1 L1 A2 L2 A3 L3 A4 L4 A5 L5 A6 L6 A7 L7 A8 L8 A9 L9 A10 L10 A11 L11 A0 | A12 L23 A23 L22 A22 L21 A21 L20 A20 L19 A19 L18 A18 L17 A17 L16 A16 L15 A15 L14 A14 L13 A13 L12
sketch "Sketch8" plane through (0, 0, -84) normal (0, 0, -1) x (-1, 0, 0)
  line L0 (-46.17, 0) -> (-11.13, 0) construction
  line L1 (-28.65, 0) -> (-28.65, 57.1) construction
  line L2 (-46.17, 57.1) -> (-11.13, 57.1) construction
  arc A0 (-30.3603, 31.325) -> (-26.9397, 31.325) centre (-28.65, 28.65) ccw projected
  circle A1 centre (-28.65, 28.65) radius 3.175
  point P0 (0, 0)
  dimension "d39" = 6.35
extrude "Extrusion8" add sketch "Sketch8" along normal blind 15
sketch "Sketch9" plane through (11.13, 0, -76) normal (0, -1, 0) x (1, 0, 0)
  line L0 (0, -8) -> (35.04, -8) projected
  line L1 (0, 0) -> (35.04, 0) projected
  line L2 (13.52, -8) -> (21.52, -8)
  line L3 (21.52, -8) -> (21.52, 0)
  line L4 (21.52, 0) -> (13.52, 0)
  line L5 (13.52, 0) -> (13.52, -8)
  line L6 (14.345, -23) -> (20.695, -23) construction
  line L7 (17.52, -23) -> (17.52, 8.4393) construction
  line L8 (17.52, 0) -> (17.52, -8) construction
  point P0 (-11.13, 76)
  point P1 (13.52, 0)
  point P2 (21.52, -8)
  dimension "d42" = 8
  dimension "d43" = 0
extrude "Extrusion9" add sketch "Sketch9" along normal blind 1
equation "\"d5\" = d4"
equation "\"d6\" = d4"
equation "\"d7\" = d4"
equation "\"d25\" = d24"
equation "\"d26\" = d24"
equation "\"d27\" = d24"
equation "\"d28\" = d24"
equation "\"d29\" = d24"
equation "\"d30\" = d24"
equation "\"d31\" = d24"
properties part number "Nema 23 Dual Shaft 87mm Stepper Motor"
